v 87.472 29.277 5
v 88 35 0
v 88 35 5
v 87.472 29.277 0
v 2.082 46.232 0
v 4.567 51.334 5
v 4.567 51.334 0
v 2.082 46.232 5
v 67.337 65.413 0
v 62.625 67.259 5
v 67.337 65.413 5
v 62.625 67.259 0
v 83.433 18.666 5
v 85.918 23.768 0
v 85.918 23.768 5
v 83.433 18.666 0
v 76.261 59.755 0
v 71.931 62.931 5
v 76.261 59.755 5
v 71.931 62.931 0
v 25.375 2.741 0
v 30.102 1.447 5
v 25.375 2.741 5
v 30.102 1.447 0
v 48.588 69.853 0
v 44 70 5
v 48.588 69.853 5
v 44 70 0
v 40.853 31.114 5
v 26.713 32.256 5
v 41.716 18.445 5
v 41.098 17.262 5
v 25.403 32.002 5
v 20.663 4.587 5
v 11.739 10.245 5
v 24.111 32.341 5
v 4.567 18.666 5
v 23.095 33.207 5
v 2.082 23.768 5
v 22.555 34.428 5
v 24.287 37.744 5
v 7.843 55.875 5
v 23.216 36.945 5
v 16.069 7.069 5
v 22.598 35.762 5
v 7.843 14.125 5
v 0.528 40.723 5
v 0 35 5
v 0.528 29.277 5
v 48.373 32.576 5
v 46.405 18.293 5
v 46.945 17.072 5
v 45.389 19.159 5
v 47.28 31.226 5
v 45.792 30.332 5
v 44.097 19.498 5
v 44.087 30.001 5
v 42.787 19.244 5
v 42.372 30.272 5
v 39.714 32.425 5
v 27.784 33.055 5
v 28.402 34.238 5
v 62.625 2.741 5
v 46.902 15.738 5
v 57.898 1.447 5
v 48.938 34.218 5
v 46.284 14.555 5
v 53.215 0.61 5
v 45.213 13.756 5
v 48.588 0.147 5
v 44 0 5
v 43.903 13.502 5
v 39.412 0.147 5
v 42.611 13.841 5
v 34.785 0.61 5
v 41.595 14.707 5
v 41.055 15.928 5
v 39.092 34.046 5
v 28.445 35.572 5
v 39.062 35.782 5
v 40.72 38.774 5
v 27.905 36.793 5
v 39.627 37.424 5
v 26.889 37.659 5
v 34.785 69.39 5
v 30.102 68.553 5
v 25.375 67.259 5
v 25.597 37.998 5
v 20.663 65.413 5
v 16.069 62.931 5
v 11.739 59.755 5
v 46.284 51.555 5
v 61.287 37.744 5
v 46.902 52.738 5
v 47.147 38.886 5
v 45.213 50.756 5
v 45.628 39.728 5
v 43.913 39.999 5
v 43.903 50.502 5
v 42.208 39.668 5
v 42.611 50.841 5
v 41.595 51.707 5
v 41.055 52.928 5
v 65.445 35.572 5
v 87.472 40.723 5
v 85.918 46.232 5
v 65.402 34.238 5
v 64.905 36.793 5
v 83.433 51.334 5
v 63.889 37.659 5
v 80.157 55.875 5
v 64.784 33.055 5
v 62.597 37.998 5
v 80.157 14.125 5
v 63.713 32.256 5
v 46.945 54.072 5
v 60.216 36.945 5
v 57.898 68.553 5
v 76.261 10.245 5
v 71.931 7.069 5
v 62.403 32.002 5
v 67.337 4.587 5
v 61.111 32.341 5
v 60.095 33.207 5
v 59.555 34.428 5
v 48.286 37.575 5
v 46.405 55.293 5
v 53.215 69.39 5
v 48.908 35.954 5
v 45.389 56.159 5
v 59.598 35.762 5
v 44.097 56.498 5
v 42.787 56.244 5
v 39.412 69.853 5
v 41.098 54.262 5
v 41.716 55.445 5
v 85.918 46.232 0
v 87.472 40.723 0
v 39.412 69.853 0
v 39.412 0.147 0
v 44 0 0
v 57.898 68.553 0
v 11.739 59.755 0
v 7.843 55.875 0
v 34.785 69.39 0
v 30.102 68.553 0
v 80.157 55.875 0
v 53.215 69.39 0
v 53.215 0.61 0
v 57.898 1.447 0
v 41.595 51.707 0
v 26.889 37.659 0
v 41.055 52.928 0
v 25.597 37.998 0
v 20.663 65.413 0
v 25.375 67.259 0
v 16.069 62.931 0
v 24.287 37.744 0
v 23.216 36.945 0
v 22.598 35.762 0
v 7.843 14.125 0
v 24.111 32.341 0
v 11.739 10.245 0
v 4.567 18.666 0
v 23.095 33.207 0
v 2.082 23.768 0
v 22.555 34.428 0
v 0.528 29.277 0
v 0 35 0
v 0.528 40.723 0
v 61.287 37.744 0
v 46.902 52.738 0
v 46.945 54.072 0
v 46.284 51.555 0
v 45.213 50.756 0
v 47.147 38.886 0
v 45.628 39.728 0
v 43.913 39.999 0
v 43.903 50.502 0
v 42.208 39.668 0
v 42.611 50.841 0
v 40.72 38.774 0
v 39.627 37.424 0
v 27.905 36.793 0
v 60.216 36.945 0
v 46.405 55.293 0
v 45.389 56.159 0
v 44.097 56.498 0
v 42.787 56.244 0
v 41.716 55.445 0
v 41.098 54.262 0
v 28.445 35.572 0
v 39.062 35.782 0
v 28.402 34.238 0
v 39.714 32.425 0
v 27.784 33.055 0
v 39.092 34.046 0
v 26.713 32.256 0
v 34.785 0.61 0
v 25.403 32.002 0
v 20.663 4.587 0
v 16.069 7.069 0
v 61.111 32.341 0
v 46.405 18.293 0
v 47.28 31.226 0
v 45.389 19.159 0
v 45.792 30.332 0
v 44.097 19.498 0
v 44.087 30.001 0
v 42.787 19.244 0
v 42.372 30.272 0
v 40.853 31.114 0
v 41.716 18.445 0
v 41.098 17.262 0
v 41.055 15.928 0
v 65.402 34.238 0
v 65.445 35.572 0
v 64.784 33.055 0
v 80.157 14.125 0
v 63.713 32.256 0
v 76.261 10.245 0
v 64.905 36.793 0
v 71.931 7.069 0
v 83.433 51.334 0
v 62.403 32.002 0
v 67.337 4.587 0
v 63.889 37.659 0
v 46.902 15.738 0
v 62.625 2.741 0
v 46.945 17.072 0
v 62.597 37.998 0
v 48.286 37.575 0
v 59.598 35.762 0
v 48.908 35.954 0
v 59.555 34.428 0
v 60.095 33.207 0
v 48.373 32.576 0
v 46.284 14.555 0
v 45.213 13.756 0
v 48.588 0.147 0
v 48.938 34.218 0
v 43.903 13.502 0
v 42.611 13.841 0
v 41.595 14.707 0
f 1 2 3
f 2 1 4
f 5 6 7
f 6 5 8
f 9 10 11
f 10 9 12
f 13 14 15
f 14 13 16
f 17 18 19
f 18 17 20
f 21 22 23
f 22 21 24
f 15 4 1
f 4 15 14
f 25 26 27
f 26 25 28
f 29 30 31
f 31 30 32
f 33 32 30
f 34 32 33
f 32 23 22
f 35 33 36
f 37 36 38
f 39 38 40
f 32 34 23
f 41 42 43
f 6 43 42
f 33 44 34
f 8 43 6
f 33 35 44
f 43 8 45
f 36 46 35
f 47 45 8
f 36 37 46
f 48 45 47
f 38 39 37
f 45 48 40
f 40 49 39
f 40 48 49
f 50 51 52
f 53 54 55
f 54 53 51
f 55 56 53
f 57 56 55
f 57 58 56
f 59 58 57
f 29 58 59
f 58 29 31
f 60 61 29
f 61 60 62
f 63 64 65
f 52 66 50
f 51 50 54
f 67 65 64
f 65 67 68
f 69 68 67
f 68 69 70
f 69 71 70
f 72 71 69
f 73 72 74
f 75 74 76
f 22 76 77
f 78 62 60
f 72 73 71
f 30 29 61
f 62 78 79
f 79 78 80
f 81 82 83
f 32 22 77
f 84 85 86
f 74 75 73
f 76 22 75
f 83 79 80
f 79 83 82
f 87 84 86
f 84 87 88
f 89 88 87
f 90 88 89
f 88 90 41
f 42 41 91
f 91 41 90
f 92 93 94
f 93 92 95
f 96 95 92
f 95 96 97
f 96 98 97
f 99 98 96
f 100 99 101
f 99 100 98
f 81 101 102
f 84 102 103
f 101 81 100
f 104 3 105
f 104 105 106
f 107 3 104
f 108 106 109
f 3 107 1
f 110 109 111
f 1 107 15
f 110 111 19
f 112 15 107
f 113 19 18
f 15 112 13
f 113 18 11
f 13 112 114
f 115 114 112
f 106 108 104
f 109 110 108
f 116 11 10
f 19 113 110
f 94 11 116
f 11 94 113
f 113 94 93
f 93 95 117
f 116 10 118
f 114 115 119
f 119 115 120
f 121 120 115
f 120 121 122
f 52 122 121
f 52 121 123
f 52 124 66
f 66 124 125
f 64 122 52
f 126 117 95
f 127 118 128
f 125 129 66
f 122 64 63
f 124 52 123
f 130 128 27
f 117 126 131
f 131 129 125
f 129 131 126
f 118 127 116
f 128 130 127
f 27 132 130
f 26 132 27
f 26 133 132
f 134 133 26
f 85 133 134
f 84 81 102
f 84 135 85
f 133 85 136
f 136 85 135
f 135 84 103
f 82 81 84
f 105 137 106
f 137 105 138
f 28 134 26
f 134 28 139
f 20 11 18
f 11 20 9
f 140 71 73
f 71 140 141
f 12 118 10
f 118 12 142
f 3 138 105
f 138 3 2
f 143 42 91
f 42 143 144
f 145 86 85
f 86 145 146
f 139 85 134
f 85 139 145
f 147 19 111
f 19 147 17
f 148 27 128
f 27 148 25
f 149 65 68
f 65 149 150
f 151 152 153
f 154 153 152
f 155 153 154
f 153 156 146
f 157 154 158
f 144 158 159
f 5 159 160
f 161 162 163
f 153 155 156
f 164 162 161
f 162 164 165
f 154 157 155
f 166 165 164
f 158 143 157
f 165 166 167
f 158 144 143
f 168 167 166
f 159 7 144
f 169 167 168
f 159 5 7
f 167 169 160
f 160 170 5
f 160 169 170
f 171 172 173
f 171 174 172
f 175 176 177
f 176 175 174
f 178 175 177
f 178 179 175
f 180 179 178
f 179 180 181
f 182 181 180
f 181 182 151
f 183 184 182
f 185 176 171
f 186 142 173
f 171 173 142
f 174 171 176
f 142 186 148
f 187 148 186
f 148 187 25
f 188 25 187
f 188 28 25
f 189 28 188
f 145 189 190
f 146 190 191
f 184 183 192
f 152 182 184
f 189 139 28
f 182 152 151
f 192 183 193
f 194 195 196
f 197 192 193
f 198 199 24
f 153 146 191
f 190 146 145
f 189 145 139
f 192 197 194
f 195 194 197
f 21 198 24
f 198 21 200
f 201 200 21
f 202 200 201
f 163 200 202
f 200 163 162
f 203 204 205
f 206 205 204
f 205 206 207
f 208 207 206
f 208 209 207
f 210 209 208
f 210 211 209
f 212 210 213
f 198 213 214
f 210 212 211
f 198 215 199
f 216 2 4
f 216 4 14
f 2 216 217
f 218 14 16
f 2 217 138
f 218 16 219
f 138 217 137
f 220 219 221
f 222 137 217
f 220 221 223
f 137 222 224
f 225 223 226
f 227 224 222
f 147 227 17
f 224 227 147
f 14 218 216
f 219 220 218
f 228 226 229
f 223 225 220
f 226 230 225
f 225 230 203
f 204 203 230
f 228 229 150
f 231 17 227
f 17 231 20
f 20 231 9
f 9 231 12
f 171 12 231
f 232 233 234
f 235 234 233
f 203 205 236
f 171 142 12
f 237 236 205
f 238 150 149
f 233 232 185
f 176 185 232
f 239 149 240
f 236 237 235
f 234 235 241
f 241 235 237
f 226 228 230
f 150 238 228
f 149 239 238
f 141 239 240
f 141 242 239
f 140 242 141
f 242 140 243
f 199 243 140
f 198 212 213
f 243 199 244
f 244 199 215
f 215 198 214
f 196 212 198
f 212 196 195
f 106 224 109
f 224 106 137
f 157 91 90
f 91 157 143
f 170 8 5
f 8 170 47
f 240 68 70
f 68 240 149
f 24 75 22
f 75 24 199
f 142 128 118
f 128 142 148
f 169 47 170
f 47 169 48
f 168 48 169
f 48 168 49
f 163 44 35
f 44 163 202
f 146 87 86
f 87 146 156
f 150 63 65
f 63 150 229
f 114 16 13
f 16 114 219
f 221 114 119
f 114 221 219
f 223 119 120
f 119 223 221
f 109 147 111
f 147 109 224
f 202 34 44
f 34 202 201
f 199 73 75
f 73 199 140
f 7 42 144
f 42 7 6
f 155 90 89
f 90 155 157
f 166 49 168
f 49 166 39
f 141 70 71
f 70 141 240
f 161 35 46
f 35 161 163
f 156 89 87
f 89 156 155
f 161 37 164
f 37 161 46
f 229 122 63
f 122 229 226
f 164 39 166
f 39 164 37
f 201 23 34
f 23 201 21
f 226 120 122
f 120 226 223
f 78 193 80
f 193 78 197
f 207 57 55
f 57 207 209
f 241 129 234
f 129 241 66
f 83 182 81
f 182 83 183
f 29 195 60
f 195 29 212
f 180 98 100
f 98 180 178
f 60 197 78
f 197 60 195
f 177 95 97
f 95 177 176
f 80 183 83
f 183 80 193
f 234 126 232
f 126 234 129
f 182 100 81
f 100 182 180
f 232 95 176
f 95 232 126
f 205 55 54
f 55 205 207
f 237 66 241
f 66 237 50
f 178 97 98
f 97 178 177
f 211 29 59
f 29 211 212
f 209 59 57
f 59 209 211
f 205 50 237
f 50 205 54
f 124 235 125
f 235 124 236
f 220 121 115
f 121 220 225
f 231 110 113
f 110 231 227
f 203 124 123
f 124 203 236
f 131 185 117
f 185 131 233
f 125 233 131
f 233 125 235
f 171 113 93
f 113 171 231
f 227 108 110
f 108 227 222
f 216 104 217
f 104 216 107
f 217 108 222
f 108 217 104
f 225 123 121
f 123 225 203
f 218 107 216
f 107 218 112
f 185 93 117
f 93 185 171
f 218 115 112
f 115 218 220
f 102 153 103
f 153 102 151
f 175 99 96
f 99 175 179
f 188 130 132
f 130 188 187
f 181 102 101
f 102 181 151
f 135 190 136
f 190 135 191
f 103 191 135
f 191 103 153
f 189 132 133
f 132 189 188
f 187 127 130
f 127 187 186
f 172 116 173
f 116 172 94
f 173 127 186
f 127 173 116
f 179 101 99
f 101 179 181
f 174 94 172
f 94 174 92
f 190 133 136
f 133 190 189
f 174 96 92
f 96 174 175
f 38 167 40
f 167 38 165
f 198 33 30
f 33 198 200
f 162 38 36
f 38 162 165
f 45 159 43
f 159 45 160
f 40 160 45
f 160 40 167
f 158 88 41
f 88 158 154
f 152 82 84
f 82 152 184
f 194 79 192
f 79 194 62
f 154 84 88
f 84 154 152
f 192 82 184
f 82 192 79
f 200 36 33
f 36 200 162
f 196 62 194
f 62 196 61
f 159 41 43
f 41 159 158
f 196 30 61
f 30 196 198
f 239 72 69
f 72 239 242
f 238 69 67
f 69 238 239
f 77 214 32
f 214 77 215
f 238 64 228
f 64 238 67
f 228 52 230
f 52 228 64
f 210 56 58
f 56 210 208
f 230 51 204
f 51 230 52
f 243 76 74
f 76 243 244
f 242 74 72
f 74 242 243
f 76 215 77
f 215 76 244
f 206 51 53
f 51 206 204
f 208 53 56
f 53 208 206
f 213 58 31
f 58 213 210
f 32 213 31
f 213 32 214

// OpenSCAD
$fn = 32;

// ----------------------------------------------------------------------
// Cam plate: double_lobe cam, base R32
// ----------------------------------------------------------------------

// --- parameters (mm) ---
base_r = 32;              // base circle radius
lobe_h = 12;              // cam lobe rise
bore_r = 5;               // shaft bore radius
plate_t = 5;              // plate thickness, Z (extrusion height)
ring_r = 18.5;            // lightening ring radius
bolt_r = 3;               // lightening hole radius
fit_tol = 0.1;            // declared fit tolerance (prompt contract)
free_tol = 0.5;           // declared free tolerance (prompt contract)

profile = [[88, 35], [87.472, 40.723], [85.918, 46.232], [83.433, 51.334], [80.157, 55.875], [76.261, 59.755], [71.931, 62.931], [67.337, 65.413], [62.625, 67.259], [57.898, 68.553], [53.215, 69.39], [48.588, 69.853], [44, 70], [39.412, 69.853], [34.785, 69.39], [30.102, 68.553], [25.375, 67.259], [20.663, 65.413], [16.069, 62.931], [11.739, 59.755], [7.843, 55.875], [4.567, 51.334], [2.082, 46.232], [0.528, 40.723], [0, 35], [0.528, 29.277], [2.082, 23.768], [4.567, 18.666], [7.843, 14.125], [11.739, 10.245], [16.069, 7.069], [20.663, 4.587], [25.375, 2.741], [30.102, 1.447], [34.785, 0.61], [39.412, 0.147], [44, 0], [48.588, 0.147], [53.215, 0.61], [57.898, 1.447], [62.625, 2.741], [67.337, 4.587], [71.931, 7.069], [76.261, 10.245], [80.157, 14.125], [83.433, 18.666], [85.918, 23.768], [87.472, 29.277]];  // primary outline, 48 points, counter clockwise
void_1 = [[48.908, 35.954], [48.286, 37.575], [47.147, 38.886], [45.628, 39.728], [43.913, 39.999], [42.208, 39.668], [40.72, 38.774], [39.627, 37.424], [39.062, 35.782], [39.092, 34.046], [39.714, 32.425], [40.853, 31.114], [42.372, 30.272], [44.087, 30.001], [45.792, 30.332], [47.28, 31.226], [48.373, 32.576], [48.938, 34.218]];  // shaft bore, 18 points
void_2 = [[65.445, 35.572], [64.905, 36.793], [63.889, 37.659], [62.597, 37.998], [61.287, 37.744], [60.216, 36.945], [59.598, 35.762], [59.555, 34.428], [60.095, 33.207], [61.111, 32.341], [62.403, 32.002], [63.713, 32.256], [64.784, 33.055], [65.402, 34.238]];  // lightening hole 1, 14 points
void_3 = [[46.945, 54.072], [46.405, 55.293], [45.389, 56.159], [44.097, 56.498], [42.787, 56.244], [41.716, 55.445], [41.098, 54.262], [41.055, 52.928], [41.595, 51.707], [42.611, 50.841], [43.903, 50.502], [45.213, 50.756], [46.284, 51.555], [46.902, 52.738]];  // lightening hole 2, 14 points
void_4 = [[28.445, 35.572], [27.905, 36.793], [26.889, 37.659], [25.597, 37.998], [24.287, 37.744], [23.216, 36.945], [22.598, 35.762], [22.555, 34.428], [23.095, 33.207], [24.111, 32.341], [25.403, 32.002], [26.713, 32.256], [27.784, 33.055], [28.402, 34.238]];  // lightening hole 3, 14 points
void_5 = [[46.945, 17.072], [46.405, 18.293], [45.389, 19.159], [44.097, 19.498], [42.787, 19.244], [41.716, 18.445], [41.098, 17.262], [41.055, 15.928], [41.595, 14.707], [42.611, 13.841], [43.903, 13.502], [45.213, 13.756], [46.284, 14.555], [46.902, 15.738]];  // lightening hole 4, 14 points

// --- the one profile operation ---
difference() {
  linear_extrude(height = plate_t) polygon(points = profile);
  translate([0, 0, -1])
    linear_extrude(height = plate_t + 2) polygon(points = void_1);
  translate([0, 0, -1])
    linear_extrude(height = plate_t + 2) polygon(points = void_2);
  translate([0, 0, -1])
    linear_extrude(height = plate_t + 2) polygon(points = void_3);
  translate([0, 0, -1])
    linear_extrude(height = plate_t + 2) polygon(points = void_4);
  translate([0, 0, -1])
    linear_extrude(height = plate_t + 2) polygon(points = void_5);
}
